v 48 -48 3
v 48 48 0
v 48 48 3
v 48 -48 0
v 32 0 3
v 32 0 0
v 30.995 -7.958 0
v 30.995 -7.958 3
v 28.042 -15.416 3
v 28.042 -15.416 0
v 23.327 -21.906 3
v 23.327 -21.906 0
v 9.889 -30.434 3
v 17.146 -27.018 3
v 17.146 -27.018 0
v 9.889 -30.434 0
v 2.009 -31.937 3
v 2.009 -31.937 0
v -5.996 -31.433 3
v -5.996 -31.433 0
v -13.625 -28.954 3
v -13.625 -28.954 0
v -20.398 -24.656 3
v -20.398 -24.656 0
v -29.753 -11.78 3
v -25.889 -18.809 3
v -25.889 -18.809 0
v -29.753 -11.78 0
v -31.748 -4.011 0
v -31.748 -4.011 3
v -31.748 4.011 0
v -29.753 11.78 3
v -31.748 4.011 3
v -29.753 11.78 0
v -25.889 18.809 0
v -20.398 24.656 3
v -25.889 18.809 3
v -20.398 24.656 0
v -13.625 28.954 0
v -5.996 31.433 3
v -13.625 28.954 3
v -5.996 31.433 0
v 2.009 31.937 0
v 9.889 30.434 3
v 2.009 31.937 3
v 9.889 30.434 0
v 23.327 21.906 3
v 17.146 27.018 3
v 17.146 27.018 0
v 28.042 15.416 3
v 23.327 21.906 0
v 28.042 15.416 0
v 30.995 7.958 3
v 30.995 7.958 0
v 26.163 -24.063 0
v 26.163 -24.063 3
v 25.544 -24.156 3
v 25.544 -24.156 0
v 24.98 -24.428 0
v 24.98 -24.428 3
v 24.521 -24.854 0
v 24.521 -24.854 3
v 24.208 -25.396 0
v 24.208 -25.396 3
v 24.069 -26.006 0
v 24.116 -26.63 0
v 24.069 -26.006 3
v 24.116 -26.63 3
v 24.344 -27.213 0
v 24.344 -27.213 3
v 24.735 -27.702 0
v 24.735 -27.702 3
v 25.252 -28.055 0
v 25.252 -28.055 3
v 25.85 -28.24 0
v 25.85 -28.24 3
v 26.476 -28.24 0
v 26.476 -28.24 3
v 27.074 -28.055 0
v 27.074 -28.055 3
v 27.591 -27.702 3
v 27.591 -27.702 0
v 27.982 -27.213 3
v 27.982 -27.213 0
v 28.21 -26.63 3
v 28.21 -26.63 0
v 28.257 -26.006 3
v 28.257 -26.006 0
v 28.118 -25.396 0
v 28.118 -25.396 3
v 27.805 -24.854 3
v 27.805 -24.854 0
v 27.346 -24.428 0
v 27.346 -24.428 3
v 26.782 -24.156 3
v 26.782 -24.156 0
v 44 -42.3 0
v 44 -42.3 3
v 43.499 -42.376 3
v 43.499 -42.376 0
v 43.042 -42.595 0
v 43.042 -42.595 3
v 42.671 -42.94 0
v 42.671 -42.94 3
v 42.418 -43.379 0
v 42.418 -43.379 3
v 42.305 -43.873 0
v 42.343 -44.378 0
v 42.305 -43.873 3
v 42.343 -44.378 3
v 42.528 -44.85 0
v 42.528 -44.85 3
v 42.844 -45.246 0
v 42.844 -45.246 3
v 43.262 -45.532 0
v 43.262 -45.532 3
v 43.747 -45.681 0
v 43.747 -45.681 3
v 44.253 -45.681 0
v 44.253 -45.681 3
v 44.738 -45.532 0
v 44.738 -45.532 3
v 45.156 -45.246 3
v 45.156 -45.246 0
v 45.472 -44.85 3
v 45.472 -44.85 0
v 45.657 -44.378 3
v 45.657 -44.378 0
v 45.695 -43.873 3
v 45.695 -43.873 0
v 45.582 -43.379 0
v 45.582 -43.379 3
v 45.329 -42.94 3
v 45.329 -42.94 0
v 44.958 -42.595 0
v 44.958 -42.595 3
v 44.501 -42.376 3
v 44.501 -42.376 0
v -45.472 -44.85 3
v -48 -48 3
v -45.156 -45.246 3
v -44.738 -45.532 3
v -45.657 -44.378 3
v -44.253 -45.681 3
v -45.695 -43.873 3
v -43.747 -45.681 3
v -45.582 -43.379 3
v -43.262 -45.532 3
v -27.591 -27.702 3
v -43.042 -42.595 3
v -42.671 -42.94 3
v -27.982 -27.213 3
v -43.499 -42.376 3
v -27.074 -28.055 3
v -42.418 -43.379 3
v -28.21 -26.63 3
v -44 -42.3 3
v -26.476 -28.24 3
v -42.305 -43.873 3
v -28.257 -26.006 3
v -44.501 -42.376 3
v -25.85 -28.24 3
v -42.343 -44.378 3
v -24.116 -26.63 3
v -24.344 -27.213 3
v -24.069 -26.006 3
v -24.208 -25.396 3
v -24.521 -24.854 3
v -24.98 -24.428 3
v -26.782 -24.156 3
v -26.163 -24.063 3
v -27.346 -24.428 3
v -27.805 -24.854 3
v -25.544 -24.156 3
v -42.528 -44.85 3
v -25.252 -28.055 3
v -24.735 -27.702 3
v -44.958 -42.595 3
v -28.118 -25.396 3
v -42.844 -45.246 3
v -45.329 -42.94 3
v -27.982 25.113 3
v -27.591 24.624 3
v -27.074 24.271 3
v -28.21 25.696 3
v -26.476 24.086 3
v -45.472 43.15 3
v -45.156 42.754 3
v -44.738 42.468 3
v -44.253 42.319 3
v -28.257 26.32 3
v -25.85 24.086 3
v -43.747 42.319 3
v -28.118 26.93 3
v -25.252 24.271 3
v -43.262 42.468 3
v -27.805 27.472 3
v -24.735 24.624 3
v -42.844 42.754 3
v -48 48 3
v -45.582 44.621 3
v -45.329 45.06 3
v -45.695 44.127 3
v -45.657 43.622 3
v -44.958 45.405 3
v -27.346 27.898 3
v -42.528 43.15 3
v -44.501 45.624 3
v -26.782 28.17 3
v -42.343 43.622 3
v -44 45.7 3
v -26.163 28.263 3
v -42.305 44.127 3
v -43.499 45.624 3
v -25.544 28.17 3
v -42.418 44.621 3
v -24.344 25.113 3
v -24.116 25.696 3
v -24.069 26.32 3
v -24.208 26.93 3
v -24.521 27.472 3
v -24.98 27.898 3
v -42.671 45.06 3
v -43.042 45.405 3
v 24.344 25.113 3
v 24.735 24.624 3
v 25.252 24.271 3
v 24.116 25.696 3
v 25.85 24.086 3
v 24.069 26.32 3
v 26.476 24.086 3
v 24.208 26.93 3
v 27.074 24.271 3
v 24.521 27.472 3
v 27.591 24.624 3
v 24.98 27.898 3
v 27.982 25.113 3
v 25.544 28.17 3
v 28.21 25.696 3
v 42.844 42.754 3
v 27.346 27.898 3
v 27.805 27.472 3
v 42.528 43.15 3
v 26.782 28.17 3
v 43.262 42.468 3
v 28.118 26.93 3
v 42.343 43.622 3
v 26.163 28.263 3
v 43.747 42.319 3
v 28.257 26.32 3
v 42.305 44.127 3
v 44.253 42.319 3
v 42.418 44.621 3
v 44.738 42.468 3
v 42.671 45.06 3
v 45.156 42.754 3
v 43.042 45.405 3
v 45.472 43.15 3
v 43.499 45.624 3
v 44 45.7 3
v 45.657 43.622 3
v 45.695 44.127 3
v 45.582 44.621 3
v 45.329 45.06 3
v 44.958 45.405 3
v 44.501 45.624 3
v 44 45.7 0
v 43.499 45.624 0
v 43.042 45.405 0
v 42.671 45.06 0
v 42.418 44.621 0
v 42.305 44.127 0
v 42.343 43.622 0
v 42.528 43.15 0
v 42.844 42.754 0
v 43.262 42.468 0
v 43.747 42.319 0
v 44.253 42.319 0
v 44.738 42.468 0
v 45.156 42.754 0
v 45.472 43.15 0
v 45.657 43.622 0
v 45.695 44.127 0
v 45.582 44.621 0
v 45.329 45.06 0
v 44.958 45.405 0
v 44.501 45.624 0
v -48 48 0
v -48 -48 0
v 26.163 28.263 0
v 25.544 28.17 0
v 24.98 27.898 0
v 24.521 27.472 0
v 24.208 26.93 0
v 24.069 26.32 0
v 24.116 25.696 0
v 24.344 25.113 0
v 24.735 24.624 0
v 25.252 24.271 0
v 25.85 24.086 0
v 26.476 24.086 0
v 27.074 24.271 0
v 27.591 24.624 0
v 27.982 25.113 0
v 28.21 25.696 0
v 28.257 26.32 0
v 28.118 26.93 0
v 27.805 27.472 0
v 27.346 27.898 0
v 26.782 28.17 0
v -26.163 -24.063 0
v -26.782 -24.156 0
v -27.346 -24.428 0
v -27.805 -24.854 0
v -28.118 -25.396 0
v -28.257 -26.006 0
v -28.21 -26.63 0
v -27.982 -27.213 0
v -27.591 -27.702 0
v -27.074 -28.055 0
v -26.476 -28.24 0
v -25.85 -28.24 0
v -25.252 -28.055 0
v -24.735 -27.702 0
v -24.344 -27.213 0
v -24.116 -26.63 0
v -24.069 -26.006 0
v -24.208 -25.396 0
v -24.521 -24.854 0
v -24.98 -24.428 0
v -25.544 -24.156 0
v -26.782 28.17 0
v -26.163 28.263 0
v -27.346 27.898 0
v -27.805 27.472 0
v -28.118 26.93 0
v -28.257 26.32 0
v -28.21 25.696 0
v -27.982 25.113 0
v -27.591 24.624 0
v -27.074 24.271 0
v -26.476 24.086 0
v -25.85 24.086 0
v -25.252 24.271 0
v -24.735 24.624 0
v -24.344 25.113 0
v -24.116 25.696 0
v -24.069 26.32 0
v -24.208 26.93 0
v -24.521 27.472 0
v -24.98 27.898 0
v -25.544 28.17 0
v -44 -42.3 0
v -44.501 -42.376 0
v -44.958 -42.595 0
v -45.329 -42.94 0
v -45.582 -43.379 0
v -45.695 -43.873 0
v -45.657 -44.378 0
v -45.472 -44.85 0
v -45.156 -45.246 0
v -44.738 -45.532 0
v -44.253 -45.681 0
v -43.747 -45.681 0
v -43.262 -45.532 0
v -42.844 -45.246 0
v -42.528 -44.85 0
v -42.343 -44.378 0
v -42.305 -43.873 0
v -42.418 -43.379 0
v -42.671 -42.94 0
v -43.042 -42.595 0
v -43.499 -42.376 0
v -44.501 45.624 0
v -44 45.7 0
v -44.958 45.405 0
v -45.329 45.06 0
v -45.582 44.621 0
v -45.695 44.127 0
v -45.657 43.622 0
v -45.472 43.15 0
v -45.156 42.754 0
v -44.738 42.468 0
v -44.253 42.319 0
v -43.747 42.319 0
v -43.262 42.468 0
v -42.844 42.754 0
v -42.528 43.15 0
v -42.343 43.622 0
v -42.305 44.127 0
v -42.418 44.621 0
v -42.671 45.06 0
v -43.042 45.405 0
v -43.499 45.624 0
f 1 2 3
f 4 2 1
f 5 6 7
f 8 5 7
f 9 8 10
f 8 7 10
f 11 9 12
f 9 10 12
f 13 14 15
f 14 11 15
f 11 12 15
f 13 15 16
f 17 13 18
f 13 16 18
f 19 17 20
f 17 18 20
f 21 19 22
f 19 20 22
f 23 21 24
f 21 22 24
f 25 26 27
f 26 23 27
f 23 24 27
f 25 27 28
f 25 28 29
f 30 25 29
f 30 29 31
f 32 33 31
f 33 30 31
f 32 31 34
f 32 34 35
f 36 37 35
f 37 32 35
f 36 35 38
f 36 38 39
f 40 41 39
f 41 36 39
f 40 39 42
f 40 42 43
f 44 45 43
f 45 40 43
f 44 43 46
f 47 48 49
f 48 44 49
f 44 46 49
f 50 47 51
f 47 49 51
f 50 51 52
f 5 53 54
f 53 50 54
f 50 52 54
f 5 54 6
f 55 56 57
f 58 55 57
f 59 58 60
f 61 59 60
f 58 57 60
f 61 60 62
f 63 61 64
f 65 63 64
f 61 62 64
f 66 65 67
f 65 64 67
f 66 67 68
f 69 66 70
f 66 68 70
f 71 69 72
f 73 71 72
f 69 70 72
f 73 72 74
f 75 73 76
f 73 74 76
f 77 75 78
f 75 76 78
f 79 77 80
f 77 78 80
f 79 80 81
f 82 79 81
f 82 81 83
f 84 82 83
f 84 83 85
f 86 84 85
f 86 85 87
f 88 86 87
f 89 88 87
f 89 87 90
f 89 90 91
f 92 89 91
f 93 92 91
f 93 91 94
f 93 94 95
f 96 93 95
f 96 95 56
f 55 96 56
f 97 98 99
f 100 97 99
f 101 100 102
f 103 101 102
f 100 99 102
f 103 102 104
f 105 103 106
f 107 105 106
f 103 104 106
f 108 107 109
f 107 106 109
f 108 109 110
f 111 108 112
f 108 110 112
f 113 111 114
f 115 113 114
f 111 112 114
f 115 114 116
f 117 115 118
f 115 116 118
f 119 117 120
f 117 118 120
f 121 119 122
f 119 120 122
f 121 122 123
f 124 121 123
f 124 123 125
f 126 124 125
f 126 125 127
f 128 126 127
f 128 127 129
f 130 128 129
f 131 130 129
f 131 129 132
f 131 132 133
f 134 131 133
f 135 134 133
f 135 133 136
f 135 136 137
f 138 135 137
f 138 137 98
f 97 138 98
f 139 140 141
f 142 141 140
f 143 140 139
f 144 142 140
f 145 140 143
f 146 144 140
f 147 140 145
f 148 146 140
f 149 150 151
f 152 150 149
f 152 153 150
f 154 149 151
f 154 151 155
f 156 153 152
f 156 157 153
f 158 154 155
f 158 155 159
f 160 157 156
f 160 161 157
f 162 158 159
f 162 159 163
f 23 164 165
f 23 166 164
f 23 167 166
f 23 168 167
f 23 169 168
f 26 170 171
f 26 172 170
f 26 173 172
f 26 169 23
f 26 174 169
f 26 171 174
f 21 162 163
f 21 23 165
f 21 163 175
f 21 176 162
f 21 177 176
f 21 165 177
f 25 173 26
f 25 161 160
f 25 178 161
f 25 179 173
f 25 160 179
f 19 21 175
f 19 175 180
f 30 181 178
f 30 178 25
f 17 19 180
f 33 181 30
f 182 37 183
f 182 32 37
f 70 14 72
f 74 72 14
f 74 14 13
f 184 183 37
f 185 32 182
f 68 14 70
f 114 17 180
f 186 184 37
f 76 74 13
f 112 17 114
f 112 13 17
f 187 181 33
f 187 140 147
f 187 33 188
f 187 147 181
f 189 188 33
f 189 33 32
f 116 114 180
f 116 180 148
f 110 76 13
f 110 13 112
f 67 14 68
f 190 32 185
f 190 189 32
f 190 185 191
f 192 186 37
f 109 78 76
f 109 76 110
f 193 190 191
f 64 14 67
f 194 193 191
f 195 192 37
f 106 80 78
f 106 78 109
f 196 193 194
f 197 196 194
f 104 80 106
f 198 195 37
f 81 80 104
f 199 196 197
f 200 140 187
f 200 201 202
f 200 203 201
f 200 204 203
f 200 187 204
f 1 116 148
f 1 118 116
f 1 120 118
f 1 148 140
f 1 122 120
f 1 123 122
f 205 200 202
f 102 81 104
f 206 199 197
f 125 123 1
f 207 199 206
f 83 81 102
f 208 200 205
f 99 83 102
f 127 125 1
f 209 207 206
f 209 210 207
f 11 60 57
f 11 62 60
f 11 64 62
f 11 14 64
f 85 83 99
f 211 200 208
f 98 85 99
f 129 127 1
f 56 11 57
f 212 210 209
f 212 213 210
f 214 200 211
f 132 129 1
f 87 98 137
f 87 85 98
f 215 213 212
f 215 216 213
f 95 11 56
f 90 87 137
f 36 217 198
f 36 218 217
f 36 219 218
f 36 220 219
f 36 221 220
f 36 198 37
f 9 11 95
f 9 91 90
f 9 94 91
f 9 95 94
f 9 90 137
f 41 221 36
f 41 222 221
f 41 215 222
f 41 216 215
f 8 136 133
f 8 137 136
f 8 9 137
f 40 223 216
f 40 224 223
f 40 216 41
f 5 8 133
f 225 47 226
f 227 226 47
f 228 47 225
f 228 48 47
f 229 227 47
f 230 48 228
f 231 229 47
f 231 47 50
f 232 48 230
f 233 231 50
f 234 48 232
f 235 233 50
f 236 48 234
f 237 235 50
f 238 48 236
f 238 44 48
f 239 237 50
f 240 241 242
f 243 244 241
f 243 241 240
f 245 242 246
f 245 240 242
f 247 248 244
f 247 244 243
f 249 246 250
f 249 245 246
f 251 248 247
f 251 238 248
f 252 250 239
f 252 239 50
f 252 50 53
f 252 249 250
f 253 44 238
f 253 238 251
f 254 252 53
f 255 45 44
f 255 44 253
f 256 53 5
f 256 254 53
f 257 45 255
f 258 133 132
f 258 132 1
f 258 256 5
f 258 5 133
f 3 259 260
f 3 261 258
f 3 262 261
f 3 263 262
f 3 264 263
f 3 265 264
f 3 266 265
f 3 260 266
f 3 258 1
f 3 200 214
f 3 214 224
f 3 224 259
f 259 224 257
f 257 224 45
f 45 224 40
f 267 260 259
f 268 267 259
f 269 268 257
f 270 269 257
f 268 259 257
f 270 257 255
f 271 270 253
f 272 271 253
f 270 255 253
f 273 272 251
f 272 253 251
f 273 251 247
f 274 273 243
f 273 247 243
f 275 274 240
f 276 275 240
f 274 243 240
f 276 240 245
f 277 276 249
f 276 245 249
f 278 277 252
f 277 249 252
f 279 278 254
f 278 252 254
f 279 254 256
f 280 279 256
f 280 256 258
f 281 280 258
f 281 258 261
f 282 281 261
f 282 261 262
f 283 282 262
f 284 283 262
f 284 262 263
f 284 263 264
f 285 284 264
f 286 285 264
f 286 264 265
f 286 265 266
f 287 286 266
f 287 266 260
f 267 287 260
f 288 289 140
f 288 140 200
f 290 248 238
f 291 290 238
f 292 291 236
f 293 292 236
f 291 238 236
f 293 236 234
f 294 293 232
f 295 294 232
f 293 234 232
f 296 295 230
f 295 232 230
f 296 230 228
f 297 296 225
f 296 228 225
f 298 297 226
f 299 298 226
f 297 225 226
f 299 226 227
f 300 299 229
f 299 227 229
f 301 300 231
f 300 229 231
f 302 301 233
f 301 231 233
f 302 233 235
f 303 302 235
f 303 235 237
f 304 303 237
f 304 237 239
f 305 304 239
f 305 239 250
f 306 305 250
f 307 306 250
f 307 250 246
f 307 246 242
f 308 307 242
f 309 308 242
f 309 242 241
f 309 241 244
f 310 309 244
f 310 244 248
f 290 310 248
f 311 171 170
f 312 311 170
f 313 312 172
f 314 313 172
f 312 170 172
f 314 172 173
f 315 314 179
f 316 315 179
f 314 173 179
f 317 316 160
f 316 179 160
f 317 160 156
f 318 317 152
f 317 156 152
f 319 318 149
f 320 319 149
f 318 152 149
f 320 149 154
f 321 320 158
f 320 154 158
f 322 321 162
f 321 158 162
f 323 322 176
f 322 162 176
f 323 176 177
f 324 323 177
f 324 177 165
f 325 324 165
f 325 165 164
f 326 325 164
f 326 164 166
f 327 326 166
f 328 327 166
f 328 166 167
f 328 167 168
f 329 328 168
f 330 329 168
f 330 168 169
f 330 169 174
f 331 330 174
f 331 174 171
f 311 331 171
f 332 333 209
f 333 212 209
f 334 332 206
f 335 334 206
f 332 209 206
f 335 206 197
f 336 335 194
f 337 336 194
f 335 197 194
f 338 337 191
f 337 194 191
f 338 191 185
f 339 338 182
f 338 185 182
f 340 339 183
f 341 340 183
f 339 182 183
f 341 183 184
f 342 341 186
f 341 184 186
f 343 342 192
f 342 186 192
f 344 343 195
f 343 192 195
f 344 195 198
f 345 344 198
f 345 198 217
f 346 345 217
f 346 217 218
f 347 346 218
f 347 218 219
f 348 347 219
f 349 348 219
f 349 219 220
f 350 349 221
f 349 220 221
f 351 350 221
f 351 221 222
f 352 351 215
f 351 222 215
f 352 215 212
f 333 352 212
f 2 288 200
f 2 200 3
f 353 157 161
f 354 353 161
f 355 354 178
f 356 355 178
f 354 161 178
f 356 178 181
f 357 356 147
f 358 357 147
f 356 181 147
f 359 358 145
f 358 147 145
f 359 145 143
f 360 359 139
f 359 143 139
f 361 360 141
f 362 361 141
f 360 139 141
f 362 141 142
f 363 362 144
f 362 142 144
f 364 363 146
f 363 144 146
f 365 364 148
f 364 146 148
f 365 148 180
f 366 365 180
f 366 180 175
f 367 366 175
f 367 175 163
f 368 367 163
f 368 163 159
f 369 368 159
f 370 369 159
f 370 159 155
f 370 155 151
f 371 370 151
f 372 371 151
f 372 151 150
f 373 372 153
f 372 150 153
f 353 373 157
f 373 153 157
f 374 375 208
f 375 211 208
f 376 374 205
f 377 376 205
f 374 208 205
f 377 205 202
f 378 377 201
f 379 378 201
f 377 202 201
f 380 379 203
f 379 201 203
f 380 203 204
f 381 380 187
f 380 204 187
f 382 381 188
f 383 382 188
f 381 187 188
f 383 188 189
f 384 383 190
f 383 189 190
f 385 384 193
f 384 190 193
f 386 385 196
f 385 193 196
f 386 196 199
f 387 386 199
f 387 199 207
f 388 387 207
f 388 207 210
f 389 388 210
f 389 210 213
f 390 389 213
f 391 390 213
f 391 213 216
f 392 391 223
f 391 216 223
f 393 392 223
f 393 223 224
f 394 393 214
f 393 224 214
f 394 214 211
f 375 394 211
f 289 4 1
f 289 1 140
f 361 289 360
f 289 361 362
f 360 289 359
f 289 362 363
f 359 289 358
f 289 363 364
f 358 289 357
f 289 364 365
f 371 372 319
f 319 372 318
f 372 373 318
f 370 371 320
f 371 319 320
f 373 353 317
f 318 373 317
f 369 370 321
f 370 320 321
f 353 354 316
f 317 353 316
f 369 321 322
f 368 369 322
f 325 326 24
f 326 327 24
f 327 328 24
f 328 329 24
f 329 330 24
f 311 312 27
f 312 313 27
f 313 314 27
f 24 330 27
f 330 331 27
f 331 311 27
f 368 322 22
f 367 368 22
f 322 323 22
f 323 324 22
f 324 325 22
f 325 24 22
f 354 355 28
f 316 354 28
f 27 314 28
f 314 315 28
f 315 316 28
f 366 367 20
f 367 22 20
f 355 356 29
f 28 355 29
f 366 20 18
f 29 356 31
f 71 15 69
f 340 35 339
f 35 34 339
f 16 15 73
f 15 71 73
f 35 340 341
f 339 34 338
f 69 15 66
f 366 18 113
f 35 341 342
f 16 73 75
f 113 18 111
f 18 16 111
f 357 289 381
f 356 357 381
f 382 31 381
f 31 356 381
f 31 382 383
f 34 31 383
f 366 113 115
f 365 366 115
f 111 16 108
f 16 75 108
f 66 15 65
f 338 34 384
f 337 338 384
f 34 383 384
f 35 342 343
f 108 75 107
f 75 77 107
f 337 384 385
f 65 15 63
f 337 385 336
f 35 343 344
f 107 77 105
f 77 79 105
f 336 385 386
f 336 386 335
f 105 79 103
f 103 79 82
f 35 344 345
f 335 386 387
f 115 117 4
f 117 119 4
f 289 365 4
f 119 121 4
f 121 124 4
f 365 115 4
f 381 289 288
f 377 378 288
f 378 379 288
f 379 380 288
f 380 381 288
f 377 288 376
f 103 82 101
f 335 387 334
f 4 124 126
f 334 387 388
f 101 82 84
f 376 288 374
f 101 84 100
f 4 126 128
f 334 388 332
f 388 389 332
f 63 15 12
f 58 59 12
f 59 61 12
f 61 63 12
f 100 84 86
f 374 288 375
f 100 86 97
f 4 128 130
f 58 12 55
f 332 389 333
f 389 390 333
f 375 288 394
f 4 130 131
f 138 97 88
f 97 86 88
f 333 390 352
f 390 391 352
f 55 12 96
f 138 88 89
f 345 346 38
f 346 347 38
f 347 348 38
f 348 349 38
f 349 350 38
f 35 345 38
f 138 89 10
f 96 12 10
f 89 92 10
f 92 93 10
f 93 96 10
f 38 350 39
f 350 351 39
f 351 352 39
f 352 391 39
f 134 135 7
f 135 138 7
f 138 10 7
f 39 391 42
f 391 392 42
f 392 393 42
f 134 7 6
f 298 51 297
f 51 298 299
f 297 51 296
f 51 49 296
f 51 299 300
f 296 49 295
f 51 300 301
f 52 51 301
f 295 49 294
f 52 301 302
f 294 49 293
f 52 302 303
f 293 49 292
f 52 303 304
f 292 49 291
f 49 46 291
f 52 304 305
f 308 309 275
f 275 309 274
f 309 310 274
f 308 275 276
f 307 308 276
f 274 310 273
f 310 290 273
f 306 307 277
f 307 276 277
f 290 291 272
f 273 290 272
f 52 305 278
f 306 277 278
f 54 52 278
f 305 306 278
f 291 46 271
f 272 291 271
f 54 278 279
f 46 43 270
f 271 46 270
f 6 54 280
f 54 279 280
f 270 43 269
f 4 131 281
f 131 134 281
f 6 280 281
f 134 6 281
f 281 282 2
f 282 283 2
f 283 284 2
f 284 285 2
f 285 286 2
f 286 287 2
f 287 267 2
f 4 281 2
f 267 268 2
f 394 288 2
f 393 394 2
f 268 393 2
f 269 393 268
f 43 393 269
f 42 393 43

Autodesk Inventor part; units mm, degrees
ref_plane "YZ Plane" through (0, 0, 0) normal (1, 0, 0) x (0, 1, 0)
ref_plane "XZ Plane" through (0, 0, 0) normal (0, 1, 0) x (-1, 0, 0)
ref_plane "XY Plane" through (0, 0, 0) normal (0, 0, 1) x (1, 0, 0)
sketch "Skizze1" plane through (0, 0, 0) normal (0, 0, 1) x (1, 0, 0)
  line L0 (48, -48) -> (-48, -48)
  line L1 (-48, -48) -> (-48, 48)
  line L2 (-48, 48) -> (48, 48)
  line L3 (48, 48) -> (48, -48)
  line L4 (48, -48) -> (-48, 48) construction
  line L5 (-48, -48) -> (48, 48) construction
  circle A0 centre (0, 0) radius 32
  circle A1 centre (0, 0) radius 37 construction
  line L6 (-40, 40) -> (-48, 40)
  line L7 (-48, 40) -> (-48, 48)
  line L8 (-48, 48) -> (-40, 48)
  line L9 (-40, 48) -> (-40, 40)
  line L10 (-40, 40) -> (-48, 48) construction
  line L11 (-48, 40) -> (-40, 48) construction
  line L12 (-40, -40) -> (-48, -40)
  line L13 (-48, -40) -> (-48, -48)
  line L14 (-48, -48) -> (-40, -48)
  line L15 (-40, -48) -> (-40, -40)
  line L16 (-40, -40) -> (-48, -48) construction
  line L17 (-48, -40) -> (-40, -48) construction
  line L18 (40, -40) -> (48, -40)
  line L19 (48, -40) -> (48, -48)
  line L20 (48, -48) -> (40, -48)
  line L21 (40, -48) -> (40, -40)
  line L22 (40, -40) -> (48, -48) construction
  line L23 (48, -40) -> (40, -48) construction
  line L24 (40, 40) -> (48, 40)
  line L25 (48, 40) -> (48, 48)
  line L26 (48, 48) -> (40, 48)
  line L27 (40, 48) -> (40, 40)
  line L28 (40, 40) -> (48, 48) construction
  line L29 (48, 40) -> (40, 48) construction
  point P0 (-26.163, 26.163)
  point P1 (26.163, 26.163)
  point P2 (26.163, -26.163)
  point P3 (-26.163, -26.163)
  point P4 (-44, 44)
  point P5 (-44, -44)
  point P6 (44, -44)
  point P7 (44, 44)
  point P8 (-44, 44)
  point P9 (44, 44)
  point P10 (-44, -44)
  point P11 (44, -44)
  dimension "d0" = 96
  dimension "d1" = 96
  dimension "d41" = 64
  dimension "d42" = 74
  dimension "d43" = 8
  dimension "d44" = 8
extrude "Extrusion1" add sketch "Skizze1" along normal blind 3
hole "Bohrung2" at (-44, 44, 0) at (44, 44, 0) at (-44, -44, 0) at (44, -44, 0) direction (0, 0, 1) diameter 3.4 end through all
hole "Bohrung3" at (-26.163, 26.163, 0) at (26.163, 26.163, 0) at (26.163, -26.163, 0) at (-26.163, -26.163, 0) direction (0, 0, 1) diameter 4.2 end through all
equation "\"d0\" = d1"
properties part number "DayLightGlow_SpeakerBase"
